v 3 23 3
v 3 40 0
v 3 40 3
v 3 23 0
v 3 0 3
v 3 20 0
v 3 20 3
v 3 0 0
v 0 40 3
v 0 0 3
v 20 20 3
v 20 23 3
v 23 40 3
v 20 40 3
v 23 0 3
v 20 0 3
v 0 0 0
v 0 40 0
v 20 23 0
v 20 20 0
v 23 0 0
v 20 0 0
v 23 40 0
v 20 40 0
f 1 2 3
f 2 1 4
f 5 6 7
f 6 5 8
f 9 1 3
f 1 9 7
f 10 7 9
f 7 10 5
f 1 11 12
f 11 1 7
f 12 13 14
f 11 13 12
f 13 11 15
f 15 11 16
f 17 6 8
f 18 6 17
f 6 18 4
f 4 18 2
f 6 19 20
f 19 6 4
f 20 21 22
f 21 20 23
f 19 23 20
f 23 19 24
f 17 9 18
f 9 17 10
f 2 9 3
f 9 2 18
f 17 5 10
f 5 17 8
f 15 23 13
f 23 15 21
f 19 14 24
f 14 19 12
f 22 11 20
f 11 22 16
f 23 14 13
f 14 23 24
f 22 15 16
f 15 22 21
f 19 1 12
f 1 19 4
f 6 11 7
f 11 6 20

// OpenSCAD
z=3;
x=40;
union(){
 cube([z,x,z]);
 translate([x/2,0,0]) cube([z,x,z]);
 translate([0,x/2,0]) cube([x/2,z,z]);
}
